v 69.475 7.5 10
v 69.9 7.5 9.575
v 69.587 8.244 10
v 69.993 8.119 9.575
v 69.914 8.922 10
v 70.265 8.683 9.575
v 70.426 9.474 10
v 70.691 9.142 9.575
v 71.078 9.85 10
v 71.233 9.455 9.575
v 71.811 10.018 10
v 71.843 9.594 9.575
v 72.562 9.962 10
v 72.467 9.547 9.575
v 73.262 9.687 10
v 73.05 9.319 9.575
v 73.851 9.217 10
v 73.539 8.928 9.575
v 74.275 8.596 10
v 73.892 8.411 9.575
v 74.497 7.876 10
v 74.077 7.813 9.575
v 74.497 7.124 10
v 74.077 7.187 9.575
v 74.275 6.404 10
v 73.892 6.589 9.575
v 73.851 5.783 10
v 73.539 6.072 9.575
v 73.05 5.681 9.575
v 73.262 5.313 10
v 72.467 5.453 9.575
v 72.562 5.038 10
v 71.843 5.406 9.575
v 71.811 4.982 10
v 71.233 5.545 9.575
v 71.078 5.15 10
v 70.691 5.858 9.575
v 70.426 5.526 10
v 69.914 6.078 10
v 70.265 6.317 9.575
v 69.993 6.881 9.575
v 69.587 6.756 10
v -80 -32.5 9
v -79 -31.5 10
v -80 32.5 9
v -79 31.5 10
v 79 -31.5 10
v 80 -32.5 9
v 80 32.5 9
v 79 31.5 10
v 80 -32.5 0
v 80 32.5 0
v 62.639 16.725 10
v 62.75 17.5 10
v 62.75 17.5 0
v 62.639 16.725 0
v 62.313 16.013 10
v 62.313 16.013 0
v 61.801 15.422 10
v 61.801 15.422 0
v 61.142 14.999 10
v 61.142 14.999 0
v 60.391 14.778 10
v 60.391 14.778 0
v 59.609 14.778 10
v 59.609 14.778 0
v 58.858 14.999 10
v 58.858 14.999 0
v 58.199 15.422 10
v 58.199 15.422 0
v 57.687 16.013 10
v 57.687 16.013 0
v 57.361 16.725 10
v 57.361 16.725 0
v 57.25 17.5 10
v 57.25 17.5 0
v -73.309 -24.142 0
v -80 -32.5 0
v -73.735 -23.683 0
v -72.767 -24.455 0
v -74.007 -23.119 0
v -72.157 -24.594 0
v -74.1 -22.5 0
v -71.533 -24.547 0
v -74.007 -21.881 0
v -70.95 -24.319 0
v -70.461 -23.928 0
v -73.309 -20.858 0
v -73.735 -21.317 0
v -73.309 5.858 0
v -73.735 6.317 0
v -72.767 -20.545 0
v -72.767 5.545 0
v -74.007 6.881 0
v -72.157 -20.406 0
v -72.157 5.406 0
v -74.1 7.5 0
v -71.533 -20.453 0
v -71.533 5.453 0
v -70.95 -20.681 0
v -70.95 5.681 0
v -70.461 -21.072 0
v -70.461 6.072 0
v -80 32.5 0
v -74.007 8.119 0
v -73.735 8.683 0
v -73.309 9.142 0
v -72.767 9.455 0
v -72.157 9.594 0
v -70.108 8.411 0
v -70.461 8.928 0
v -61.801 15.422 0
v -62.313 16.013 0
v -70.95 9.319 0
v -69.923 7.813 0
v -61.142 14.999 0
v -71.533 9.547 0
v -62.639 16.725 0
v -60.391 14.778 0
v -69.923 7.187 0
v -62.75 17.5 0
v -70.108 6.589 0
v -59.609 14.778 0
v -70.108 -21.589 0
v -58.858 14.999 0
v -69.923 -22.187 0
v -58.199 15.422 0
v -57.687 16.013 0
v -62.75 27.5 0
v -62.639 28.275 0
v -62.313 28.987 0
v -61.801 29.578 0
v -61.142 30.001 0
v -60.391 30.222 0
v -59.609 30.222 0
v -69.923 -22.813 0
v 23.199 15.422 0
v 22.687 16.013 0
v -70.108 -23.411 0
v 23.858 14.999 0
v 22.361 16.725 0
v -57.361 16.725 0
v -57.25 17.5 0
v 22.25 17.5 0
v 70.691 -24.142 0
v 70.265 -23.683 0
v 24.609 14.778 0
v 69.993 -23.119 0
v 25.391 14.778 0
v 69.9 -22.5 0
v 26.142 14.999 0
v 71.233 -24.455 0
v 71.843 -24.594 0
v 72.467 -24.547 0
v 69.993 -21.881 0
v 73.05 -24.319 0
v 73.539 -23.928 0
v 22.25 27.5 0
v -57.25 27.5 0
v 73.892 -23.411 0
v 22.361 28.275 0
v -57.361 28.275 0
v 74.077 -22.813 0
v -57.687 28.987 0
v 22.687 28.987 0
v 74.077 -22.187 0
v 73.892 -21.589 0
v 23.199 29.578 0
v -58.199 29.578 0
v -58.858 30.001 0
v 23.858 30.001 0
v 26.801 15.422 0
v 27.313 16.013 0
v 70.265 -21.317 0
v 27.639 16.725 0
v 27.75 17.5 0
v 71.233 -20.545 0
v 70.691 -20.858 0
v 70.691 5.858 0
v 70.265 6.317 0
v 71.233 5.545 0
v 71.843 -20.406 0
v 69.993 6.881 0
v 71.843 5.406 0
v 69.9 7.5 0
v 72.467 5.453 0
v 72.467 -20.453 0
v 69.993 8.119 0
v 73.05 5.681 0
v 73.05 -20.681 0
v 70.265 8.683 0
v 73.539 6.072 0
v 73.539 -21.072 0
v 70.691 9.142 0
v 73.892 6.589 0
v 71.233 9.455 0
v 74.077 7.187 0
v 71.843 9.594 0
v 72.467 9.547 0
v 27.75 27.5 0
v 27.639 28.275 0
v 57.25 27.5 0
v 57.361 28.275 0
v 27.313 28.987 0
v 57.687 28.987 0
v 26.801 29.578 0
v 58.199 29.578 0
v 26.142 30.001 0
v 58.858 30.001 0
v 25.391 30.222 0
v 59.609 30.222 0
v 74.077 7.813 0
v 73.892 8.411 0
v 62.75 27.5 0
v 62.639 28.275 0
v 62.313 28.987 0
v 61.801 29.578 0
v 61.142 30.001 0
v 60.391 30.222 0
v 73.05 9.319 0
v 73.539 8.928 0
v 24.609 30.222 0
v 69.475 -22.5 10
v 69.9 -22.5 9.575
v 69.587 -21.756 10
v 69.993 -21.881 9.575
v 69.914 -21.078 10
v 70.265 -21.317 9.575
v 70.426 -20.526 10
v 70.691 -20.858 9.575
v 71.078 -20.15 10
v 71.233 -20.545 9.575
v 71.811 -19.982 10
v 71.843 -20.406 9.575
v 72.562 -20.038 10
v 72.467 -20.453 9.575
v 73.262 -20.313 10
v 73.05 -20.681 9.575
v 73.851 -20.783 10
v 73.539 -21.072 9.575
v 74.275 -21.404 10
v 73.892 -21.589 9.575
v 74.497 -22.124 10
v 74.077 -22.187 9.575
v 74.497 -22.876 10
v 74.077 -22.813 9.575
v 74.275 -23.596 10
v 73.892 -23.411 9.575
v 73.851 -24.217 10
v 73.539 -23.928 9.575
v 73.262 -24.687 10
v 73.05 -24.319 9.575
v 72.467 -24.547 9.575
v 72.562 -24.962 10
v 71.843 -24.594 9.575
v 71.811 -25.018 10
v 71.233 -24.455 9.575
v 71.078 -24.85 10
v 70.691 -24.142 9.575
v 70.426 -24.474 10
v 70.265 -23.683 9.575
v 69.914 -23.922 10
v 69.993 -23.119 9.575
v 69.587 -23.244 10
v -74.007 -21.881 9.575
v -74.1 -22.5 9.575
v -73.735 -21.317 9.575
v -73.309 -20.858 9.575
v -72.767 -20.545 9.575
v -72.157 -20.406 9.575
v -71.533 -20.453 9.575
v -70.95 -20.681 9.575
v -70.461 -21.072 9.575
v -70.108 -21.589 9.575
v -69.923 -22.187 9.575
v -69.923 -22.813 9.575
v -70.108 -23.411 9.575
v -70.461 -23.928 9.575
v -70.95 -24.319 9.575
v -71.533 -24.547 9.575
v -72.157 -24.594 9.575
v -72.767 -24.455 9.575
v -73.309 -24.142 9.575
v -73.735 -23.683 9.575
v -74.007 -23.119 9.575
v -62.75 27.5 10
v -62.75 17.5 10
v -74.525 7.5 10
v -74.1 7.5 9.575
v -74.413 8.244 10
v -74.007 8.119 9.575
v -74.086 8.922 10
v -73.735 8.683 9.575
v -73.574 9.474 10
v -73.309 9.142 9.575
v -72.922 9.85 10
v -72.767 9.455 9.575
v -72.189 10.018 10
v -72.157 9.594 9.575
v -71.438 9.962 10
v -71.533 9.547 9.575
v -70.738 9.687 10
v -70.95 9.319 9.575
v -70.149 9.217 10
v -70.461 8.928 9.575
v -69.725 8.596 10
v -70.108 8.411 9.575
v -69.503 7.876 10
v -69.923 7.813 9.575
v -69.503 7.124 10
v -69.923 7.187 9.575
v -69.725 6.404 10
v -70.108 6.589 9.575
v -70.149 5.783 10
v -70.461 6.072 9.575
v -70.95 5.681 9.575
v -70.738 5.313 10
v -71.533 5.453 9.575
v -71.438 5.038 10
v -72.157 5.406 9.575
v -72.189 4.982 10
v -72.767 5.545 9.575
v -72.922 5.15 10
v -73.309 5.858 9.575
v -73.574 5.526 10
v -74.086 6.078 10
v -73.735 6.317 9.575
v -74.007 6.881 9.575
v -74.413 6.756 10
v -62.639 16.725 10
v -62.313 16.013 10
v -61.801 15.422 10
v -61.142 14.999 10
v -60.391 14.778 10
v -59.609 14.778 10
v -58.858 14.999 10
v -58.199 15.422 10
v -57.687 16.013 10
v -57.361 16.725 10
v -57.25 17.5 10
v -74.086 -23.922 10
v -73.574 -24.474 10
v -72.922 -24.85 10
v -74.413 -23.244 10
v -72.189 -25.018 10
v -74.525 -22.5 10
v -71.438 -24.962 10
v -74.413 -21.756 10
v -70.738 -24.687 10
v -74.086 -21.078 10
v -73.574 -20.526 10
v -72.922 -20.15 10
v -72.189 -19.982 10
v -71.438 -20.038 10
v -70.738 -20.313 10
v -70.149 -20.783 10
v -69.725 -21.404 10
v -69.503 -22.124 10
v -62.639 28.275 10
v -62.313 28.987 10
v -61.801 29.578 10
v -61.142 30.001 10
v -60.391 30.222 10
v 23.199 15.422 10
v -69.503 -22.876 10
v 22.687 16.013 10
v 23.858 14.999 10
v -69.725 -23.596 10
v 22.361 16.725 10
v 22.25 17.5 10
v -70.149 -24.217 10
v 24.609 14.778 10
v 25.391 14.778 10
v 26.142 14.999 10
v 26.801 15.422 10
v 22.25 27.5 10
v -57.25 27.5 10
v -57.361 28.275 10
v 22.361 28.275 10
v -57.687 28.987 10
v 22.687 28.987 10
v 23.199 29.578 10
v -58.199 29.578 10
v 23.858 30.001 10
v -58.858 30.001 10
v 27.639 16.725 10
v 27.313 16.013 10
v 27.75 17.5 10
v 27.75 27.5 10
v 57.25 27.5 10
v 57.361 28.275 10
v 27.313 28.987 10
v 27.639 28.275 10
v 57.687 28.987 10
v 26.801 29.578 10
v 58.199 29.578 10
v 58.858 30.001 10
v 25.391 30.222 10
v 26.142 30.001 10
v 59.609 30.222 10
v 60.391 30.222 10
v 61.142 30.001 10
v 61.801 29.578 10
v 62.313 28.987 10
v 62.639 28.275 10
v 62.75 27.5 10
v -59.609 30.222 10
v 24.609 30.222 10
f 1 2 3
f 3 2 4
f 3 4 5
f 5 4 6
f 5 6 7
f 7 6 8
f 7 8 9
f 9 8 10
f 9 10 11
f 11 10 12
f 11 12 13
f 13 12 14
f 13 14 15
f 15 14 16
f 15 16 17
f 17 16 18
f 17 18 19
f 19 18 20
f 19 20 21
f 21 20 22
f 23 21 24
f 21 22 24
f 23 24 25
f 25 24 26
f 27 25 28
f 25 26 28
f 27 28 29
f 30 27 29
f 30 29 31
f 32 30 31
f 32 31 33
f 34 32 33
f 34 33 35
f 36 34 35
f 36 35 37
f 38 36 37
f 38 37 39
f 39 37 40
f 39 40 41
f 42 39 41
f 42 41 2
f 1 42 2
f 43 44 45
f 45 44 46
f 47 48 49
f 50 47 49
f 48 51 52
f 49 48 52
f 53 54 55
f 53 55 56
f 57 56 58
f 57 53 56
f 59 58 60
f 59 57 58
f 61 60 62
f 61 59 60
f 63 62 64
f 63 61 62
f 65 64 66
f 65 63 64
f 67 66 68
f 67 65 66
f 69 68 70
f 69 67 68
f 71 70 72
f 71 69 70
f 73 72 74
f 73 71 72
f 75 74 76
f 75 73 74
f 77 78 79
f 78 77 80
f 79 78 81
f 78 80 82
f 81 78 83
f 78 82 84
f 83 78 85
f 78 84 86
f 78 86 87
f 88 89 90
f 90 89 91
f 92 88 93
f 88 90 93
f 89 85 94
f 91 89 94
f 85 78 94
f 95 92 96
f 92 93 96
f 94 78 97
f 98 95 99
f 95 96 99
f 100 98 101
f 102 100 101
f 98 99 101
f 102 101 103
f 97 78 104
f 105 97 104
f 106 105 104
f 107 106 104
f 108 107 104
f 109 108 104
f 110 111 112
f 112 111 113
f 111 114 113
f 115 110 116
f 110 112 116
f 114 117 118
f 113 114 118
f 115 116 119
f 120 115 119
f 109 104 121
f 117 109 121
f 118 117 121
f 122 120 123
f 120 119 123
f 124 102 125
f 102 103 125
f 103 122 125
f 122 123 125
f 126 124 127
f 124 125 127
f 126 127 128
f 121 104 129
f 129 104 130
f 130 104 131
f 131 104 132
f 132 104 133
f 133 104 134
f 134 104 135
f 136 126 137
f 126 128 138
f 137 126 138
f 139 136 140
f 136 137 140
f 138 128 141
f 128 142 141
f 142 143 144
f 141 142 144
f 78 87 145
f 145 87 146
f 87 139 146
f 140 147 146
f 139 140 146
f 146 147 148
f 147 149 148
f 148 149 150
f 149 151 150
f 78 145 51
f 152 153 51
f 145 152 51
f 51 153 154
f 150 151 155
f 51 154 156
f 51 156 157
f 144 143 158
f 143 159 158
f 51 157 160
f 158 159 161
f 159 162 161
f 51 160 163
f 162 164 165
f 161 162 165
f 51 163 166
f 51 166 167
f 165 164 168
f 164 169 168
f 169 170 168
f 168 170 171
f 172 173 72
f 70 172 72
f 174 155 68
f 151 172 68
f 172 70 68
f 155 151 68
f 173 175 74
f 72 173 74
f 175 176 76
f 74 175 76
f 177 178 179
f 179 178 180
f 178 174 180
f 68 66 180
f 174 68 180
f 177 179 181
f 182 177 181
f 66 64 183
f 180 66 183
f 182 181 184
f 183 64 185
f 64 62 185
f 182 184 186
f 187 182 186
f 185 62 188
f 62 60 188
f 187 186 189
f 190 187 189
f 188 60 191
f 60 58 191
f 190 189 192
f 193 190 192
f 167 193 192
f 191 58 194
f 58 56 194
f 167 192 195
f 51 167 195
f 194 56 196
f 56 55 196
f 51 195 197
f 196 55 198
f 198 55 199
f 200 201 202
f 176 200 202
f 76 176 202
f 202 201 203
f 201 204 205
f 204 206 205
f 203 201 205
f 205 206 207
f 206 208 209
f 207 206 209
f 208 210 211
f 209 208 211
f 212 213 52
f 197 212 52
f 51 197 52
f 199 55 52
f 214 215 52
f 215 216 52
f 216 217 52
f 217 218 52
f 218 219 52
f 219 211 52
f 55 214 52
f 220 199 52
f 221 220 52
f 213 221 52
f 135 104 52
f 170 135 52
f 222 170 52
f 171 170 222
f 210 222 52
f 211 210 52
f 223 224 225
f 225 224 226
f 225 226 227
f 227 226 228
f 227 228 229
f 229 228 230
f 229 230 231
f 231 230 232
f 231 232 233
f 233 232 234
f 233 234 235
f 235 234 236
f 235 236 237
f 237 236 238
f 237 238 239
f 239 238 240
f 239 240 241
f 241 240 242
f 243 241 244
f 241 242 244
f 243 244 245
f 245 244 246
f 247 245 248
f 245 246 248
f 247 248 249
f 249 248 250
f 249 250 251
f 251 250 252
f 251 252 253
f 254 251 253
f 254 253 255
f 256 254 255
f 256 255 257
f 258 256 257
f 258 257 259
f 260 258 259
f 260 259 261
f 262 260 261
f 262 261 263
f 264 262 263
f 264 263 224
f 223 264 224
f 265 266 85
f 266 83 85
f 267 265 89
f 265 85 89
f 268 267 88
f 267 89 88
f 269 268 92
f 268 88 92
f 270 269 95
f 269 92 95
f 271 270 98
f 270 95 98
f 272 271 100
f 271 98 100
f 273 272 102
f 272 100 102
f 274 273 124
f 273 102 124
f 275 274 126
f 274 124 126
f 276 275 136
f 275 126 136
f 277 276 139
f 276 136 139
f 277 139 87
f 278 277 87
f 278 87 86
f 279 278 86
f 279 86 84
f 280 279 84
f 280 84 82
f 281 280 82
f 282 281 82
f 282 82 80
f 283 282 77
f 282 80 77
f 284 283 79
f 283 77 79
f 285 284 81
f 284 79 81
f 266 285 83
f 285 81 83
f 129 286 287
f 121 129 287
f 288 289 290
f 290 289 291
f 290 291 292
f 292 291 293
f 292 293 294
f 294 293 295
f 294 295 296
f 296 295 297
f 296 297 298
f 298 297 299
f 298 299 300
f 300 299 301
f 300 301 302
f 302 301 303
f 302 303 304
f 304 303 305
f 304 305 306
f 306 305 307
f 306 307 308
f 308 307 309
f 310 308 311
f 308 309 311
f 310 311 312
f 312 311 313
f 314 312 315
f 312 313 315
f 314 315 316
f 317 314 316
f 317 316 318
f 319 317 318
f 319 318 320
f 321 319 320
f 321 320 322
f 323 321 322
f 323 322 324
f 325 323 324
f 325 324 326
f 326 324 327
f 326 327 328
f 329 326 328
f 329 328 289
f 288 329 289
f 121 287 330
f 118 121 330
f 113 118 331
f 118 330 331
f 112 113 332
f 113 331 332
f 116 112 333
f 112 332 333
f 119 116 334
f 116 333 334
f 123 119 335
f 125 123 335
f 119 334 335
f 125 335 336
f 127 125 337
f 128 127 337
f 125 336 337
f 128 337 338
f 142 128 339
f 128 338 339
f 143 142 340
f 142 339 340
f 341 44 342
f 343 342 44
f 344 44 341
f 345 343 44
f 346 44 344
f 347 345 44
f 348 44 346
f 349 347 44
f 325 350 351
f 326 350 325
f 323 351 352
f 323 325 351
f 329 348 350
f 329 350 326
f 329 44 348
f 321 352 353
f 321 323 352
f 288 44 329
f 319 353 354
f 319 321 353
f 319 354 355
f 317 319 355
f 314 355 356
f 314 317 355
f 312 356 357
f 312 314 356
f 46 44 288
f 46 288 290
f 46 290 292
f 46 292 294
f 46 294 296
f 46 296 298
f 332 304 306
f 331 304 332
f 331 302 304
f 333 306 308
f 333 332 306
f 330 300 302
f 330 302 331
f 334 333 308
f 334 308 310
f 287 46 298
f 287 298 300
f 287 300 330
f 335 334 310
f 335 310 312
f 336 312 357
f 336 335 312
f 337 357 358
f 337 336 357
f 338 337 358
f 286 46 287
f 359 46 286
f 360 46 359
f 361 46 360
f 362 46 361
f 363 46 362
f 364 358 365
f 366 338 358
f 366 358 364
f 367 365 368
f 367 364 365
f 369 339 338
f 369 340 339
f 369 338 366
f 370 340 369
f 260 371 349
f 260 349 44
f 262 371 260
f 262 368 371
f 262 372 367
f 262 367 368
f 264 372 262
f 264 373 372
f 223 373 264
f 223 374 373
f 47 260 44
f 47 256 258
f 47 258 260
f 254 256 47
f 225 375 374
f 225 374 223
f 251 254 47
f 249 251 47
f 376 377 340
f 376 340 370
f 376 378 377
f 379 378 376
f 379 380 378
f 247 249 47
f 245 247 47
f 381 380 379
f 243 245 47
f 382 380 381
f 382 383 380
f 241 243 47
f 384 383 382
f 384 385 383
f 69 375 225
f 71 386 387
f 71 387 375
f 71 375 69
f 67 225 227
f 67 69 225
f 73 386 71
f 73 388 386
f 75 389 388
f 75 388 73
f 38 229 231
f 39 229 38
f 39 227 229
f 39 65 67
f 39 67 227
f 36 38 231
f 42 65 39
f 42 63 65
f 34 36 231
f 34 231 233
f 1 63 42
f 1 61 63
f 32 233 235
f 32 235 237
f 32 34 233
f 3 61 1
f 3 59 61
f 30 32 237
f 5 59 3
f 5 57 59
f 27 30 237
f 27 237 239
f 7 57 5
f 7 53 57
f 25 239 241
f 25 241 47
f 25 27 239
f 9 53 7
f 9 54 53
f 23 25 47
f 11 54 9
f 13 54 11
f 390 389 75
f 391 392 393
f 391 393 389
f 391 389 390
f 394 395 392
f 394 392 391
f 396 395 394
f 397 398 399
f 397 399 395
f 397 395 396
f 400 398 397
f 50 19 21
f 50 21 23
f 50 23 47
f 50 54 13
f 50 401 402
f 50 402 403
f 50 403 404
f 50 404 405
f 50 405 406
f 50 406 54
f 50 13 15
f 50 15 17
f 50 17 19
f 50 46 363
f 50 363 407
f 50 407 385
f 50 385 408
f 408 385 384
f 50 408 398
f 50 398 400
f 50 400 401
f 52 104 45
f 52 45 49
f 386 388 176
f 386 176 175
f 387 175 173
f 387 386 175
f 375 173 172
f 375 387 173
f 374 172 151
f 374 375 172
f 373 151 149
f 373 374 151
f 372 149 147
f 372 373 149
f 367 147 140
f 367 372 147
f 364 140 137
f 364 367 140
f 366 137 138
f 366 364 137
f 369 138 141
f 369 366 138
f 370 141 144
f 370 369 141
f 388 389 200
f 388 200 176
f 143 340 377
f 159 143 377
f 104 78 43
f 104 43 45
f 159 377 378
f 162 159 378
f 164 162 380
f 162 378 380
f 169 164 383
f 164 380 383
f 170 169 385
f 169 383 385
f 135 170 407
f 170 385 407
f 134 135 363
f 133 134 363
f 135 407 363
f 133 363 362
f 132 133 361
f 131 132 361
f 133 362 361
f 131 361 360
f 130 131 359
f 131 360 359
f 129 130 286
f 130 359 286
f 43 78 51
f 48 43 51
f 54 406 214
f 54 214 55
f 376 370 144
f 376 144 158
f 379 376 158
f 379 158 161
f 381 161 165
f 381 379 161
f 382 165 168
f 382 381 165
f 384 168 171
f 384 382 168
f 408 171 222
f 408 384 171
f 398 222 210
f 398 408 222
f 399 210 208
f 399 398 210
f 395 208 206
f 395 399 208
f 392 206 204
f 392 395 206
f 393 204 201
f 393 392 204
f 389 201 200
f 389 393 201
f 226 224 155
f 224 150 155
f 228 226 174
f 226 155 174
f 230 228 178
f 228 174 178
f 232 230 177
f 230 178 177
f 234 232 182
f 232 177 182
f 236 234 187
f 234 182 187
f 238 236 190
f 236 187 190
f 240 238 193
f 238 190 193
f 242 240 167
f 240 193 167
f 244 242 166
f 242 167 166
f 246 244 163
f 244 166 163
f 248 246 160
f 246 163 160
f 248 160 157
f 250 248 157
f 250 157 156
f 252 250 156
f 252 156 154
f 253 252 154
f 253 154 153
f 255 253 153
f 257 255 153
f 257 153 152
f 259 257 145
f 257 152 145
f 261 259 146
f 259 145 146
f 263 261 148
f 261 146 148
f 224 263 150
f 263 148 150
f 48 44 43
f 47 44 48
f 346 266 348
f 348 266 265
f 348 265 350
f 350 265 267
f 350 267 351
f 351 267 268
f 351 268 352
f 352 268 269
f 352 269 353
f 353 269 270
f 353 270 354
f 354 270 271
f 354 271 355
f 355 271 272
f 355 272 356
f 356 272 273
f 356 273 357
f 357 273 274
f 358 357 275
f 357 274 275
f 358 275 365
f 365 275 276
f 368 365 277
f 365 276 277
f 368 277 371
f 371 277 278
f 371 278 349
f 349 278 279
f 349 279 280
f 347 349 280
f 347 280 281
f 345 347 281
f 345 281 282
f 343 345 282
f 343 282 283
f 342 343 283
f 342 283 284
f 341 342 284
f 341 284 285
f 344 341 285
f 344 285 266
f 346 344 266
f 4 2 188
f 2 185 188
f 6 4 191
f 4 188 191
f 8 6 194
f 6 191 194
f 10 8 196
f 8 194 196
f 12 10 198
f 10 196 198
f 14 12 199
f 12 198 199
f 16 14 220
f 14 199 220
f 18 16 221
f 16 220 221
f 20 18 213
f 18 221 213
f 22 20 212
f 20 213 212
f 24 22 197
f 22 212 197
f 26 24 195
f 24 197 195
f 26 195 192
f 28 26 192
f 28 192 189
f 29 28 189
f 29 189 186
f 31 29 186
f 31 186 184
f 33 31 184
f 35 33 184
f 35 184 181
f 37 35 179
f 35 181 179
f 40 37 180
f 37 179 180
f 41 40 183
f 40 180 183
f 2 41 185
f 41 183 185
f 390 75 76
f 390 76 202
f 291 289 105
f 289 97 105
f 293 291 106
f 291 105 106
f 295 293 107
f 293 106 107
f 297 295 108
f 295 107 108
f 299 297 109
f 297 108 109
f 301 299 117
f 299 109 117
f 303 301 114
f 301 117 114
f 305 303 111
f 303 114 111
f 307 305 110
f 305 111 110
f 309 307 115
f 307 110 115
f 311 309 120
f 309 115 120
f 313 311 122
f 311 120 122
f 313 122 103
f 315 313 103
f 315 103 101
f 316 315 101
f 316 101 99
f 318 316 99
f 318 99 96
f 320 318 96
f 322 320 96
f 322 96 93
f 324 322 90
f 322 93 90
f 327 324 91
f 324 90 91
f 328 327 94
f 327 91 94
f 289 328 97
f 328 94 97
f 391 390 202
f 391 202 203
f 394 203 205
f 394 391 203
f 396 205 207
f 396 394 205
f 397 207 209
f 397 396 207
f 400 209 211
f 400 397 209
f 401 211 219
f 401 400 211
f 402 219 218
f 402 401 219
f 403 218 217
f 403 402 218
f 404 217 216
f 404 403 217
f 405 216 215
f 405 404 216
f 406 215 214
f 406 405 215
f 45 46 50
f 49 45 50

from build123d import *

# Parameters (mm, degrees)
SKIZZE1_W                       = 160
SKIZZE1_H                       = 65
AUFSATZ_LINEAR_AUSTRAGEN1_DEPTH = 10
M5_GEWINDEBOHRUNG1_D            = 4.2
M5_GEWINDEBOHRUNG1_DEPTH        = 14
M5_GEWINDEBOHRUNG1_CSINK_D      = 5.05
M5_GEWINDEBOHRUNG1_CSINK_ANGLE  = 90
M5_GEWINDEBOHRUNG1_TIP          = 1.2618073
SCHNITT_LINEAR_AUSTRAGEN1_DEPTH = 87.926693254
FASE1_SIZE                      = 1


with BuildPart() as part:
    # Skizze1 → Aufsatz-Linear austragen1 (new body)
    with BuildSketch(Plane.XY):
        Rectangle(SKIZZE1_W, SKIZZE1_H)
    extrude(amount=AUFSATZ_LINEAR_AUSTRAGEN1_DEPTH)

    # M5 Gewindebohrung1
    with Locations(Plane.XY.offset(10)):
        with Locations((-72, 7.5), (-72, -22.5), (72, -22.5), (72, 7.5)):
            CounterSinkHole(M5_GEWINDEBOHRUNG1_D / 2, M5_GEWINDEBOHRUNG1_CSINK_D / 2, depth=M5_GEWINDEBOHRUNG1_DEPTH, counter_sink_angle=M5_GEWINDEBOHRUNG1_CSINK_ANGLE)
            with Locations((0, 0, -(M5_GEWINDEBOHRUNG1_DEPTH + M5_GEWINDEBOHRUNG1_TIP / 2))):  # 118° drill point
                Cone(0, M5_GEWINDEBOHRUNG1_D / 2, M5_GEWINDEBOHRUNG1_TIP, mode=Mode.SUBTRACT)

    # Skizze4 → Schnitt-Linear austragen1 (cut, through all)
    with BuildSketch(Plane.XY.offset(10)):
        with BuildLine():
            Line((27.75, 27.5), (27.75, 17.5))
            ThreePointArc((27.75, 17.5), (25, 14.75), (22.25, 17.5))
            Line((22.25, 17.5), (22.25, 27.5))
            ThreePointArc((22.25, 27.5), (25, 30.25), (27.75, 27.5))
        make_face()
        with BuildLine():
            Line((57.25, 17.5), (57.25, 27.5))
            ThreePointArc((57.25, 27.5), (60, 30.25), (62.75, 27.5))
            Line((62.75, 27.5), (62.75, 17.5))
            ThreePointArc((62.75, 17.5), (60, 14.75), (57.25, 17.5))
        make_face()
        with BuildLine():
            Line((-57.25, 17.5), (-57.25, 27.5))
            ThreePointArc((-57.25, 27.5), (-60, 30.25), (-62.75, 27.5))
            Line((-62.75, 27.5), (-62.75, 17.5))
            ThreePointArc((-62.75, 17.5), (-60, 14.75), (-57.25, 17.5))
        make_face()
    extrude(amount=-SCHNITT_LINEAR_AUSTRAGEN1_DEPTH, mode=Mode.SUBTRACT)

    # Fase1
    fase1_edges = [part.edges().sort_by_distance(p)[0] for p in [
        (80, 0, 10),
        (0, 32.5, 10),
        (-80, 0, 10),
        (0, -32.5, 10),
    ]]
    chamfer(fase1_edges, length=FASE1_SIZE)


solid = part.part
